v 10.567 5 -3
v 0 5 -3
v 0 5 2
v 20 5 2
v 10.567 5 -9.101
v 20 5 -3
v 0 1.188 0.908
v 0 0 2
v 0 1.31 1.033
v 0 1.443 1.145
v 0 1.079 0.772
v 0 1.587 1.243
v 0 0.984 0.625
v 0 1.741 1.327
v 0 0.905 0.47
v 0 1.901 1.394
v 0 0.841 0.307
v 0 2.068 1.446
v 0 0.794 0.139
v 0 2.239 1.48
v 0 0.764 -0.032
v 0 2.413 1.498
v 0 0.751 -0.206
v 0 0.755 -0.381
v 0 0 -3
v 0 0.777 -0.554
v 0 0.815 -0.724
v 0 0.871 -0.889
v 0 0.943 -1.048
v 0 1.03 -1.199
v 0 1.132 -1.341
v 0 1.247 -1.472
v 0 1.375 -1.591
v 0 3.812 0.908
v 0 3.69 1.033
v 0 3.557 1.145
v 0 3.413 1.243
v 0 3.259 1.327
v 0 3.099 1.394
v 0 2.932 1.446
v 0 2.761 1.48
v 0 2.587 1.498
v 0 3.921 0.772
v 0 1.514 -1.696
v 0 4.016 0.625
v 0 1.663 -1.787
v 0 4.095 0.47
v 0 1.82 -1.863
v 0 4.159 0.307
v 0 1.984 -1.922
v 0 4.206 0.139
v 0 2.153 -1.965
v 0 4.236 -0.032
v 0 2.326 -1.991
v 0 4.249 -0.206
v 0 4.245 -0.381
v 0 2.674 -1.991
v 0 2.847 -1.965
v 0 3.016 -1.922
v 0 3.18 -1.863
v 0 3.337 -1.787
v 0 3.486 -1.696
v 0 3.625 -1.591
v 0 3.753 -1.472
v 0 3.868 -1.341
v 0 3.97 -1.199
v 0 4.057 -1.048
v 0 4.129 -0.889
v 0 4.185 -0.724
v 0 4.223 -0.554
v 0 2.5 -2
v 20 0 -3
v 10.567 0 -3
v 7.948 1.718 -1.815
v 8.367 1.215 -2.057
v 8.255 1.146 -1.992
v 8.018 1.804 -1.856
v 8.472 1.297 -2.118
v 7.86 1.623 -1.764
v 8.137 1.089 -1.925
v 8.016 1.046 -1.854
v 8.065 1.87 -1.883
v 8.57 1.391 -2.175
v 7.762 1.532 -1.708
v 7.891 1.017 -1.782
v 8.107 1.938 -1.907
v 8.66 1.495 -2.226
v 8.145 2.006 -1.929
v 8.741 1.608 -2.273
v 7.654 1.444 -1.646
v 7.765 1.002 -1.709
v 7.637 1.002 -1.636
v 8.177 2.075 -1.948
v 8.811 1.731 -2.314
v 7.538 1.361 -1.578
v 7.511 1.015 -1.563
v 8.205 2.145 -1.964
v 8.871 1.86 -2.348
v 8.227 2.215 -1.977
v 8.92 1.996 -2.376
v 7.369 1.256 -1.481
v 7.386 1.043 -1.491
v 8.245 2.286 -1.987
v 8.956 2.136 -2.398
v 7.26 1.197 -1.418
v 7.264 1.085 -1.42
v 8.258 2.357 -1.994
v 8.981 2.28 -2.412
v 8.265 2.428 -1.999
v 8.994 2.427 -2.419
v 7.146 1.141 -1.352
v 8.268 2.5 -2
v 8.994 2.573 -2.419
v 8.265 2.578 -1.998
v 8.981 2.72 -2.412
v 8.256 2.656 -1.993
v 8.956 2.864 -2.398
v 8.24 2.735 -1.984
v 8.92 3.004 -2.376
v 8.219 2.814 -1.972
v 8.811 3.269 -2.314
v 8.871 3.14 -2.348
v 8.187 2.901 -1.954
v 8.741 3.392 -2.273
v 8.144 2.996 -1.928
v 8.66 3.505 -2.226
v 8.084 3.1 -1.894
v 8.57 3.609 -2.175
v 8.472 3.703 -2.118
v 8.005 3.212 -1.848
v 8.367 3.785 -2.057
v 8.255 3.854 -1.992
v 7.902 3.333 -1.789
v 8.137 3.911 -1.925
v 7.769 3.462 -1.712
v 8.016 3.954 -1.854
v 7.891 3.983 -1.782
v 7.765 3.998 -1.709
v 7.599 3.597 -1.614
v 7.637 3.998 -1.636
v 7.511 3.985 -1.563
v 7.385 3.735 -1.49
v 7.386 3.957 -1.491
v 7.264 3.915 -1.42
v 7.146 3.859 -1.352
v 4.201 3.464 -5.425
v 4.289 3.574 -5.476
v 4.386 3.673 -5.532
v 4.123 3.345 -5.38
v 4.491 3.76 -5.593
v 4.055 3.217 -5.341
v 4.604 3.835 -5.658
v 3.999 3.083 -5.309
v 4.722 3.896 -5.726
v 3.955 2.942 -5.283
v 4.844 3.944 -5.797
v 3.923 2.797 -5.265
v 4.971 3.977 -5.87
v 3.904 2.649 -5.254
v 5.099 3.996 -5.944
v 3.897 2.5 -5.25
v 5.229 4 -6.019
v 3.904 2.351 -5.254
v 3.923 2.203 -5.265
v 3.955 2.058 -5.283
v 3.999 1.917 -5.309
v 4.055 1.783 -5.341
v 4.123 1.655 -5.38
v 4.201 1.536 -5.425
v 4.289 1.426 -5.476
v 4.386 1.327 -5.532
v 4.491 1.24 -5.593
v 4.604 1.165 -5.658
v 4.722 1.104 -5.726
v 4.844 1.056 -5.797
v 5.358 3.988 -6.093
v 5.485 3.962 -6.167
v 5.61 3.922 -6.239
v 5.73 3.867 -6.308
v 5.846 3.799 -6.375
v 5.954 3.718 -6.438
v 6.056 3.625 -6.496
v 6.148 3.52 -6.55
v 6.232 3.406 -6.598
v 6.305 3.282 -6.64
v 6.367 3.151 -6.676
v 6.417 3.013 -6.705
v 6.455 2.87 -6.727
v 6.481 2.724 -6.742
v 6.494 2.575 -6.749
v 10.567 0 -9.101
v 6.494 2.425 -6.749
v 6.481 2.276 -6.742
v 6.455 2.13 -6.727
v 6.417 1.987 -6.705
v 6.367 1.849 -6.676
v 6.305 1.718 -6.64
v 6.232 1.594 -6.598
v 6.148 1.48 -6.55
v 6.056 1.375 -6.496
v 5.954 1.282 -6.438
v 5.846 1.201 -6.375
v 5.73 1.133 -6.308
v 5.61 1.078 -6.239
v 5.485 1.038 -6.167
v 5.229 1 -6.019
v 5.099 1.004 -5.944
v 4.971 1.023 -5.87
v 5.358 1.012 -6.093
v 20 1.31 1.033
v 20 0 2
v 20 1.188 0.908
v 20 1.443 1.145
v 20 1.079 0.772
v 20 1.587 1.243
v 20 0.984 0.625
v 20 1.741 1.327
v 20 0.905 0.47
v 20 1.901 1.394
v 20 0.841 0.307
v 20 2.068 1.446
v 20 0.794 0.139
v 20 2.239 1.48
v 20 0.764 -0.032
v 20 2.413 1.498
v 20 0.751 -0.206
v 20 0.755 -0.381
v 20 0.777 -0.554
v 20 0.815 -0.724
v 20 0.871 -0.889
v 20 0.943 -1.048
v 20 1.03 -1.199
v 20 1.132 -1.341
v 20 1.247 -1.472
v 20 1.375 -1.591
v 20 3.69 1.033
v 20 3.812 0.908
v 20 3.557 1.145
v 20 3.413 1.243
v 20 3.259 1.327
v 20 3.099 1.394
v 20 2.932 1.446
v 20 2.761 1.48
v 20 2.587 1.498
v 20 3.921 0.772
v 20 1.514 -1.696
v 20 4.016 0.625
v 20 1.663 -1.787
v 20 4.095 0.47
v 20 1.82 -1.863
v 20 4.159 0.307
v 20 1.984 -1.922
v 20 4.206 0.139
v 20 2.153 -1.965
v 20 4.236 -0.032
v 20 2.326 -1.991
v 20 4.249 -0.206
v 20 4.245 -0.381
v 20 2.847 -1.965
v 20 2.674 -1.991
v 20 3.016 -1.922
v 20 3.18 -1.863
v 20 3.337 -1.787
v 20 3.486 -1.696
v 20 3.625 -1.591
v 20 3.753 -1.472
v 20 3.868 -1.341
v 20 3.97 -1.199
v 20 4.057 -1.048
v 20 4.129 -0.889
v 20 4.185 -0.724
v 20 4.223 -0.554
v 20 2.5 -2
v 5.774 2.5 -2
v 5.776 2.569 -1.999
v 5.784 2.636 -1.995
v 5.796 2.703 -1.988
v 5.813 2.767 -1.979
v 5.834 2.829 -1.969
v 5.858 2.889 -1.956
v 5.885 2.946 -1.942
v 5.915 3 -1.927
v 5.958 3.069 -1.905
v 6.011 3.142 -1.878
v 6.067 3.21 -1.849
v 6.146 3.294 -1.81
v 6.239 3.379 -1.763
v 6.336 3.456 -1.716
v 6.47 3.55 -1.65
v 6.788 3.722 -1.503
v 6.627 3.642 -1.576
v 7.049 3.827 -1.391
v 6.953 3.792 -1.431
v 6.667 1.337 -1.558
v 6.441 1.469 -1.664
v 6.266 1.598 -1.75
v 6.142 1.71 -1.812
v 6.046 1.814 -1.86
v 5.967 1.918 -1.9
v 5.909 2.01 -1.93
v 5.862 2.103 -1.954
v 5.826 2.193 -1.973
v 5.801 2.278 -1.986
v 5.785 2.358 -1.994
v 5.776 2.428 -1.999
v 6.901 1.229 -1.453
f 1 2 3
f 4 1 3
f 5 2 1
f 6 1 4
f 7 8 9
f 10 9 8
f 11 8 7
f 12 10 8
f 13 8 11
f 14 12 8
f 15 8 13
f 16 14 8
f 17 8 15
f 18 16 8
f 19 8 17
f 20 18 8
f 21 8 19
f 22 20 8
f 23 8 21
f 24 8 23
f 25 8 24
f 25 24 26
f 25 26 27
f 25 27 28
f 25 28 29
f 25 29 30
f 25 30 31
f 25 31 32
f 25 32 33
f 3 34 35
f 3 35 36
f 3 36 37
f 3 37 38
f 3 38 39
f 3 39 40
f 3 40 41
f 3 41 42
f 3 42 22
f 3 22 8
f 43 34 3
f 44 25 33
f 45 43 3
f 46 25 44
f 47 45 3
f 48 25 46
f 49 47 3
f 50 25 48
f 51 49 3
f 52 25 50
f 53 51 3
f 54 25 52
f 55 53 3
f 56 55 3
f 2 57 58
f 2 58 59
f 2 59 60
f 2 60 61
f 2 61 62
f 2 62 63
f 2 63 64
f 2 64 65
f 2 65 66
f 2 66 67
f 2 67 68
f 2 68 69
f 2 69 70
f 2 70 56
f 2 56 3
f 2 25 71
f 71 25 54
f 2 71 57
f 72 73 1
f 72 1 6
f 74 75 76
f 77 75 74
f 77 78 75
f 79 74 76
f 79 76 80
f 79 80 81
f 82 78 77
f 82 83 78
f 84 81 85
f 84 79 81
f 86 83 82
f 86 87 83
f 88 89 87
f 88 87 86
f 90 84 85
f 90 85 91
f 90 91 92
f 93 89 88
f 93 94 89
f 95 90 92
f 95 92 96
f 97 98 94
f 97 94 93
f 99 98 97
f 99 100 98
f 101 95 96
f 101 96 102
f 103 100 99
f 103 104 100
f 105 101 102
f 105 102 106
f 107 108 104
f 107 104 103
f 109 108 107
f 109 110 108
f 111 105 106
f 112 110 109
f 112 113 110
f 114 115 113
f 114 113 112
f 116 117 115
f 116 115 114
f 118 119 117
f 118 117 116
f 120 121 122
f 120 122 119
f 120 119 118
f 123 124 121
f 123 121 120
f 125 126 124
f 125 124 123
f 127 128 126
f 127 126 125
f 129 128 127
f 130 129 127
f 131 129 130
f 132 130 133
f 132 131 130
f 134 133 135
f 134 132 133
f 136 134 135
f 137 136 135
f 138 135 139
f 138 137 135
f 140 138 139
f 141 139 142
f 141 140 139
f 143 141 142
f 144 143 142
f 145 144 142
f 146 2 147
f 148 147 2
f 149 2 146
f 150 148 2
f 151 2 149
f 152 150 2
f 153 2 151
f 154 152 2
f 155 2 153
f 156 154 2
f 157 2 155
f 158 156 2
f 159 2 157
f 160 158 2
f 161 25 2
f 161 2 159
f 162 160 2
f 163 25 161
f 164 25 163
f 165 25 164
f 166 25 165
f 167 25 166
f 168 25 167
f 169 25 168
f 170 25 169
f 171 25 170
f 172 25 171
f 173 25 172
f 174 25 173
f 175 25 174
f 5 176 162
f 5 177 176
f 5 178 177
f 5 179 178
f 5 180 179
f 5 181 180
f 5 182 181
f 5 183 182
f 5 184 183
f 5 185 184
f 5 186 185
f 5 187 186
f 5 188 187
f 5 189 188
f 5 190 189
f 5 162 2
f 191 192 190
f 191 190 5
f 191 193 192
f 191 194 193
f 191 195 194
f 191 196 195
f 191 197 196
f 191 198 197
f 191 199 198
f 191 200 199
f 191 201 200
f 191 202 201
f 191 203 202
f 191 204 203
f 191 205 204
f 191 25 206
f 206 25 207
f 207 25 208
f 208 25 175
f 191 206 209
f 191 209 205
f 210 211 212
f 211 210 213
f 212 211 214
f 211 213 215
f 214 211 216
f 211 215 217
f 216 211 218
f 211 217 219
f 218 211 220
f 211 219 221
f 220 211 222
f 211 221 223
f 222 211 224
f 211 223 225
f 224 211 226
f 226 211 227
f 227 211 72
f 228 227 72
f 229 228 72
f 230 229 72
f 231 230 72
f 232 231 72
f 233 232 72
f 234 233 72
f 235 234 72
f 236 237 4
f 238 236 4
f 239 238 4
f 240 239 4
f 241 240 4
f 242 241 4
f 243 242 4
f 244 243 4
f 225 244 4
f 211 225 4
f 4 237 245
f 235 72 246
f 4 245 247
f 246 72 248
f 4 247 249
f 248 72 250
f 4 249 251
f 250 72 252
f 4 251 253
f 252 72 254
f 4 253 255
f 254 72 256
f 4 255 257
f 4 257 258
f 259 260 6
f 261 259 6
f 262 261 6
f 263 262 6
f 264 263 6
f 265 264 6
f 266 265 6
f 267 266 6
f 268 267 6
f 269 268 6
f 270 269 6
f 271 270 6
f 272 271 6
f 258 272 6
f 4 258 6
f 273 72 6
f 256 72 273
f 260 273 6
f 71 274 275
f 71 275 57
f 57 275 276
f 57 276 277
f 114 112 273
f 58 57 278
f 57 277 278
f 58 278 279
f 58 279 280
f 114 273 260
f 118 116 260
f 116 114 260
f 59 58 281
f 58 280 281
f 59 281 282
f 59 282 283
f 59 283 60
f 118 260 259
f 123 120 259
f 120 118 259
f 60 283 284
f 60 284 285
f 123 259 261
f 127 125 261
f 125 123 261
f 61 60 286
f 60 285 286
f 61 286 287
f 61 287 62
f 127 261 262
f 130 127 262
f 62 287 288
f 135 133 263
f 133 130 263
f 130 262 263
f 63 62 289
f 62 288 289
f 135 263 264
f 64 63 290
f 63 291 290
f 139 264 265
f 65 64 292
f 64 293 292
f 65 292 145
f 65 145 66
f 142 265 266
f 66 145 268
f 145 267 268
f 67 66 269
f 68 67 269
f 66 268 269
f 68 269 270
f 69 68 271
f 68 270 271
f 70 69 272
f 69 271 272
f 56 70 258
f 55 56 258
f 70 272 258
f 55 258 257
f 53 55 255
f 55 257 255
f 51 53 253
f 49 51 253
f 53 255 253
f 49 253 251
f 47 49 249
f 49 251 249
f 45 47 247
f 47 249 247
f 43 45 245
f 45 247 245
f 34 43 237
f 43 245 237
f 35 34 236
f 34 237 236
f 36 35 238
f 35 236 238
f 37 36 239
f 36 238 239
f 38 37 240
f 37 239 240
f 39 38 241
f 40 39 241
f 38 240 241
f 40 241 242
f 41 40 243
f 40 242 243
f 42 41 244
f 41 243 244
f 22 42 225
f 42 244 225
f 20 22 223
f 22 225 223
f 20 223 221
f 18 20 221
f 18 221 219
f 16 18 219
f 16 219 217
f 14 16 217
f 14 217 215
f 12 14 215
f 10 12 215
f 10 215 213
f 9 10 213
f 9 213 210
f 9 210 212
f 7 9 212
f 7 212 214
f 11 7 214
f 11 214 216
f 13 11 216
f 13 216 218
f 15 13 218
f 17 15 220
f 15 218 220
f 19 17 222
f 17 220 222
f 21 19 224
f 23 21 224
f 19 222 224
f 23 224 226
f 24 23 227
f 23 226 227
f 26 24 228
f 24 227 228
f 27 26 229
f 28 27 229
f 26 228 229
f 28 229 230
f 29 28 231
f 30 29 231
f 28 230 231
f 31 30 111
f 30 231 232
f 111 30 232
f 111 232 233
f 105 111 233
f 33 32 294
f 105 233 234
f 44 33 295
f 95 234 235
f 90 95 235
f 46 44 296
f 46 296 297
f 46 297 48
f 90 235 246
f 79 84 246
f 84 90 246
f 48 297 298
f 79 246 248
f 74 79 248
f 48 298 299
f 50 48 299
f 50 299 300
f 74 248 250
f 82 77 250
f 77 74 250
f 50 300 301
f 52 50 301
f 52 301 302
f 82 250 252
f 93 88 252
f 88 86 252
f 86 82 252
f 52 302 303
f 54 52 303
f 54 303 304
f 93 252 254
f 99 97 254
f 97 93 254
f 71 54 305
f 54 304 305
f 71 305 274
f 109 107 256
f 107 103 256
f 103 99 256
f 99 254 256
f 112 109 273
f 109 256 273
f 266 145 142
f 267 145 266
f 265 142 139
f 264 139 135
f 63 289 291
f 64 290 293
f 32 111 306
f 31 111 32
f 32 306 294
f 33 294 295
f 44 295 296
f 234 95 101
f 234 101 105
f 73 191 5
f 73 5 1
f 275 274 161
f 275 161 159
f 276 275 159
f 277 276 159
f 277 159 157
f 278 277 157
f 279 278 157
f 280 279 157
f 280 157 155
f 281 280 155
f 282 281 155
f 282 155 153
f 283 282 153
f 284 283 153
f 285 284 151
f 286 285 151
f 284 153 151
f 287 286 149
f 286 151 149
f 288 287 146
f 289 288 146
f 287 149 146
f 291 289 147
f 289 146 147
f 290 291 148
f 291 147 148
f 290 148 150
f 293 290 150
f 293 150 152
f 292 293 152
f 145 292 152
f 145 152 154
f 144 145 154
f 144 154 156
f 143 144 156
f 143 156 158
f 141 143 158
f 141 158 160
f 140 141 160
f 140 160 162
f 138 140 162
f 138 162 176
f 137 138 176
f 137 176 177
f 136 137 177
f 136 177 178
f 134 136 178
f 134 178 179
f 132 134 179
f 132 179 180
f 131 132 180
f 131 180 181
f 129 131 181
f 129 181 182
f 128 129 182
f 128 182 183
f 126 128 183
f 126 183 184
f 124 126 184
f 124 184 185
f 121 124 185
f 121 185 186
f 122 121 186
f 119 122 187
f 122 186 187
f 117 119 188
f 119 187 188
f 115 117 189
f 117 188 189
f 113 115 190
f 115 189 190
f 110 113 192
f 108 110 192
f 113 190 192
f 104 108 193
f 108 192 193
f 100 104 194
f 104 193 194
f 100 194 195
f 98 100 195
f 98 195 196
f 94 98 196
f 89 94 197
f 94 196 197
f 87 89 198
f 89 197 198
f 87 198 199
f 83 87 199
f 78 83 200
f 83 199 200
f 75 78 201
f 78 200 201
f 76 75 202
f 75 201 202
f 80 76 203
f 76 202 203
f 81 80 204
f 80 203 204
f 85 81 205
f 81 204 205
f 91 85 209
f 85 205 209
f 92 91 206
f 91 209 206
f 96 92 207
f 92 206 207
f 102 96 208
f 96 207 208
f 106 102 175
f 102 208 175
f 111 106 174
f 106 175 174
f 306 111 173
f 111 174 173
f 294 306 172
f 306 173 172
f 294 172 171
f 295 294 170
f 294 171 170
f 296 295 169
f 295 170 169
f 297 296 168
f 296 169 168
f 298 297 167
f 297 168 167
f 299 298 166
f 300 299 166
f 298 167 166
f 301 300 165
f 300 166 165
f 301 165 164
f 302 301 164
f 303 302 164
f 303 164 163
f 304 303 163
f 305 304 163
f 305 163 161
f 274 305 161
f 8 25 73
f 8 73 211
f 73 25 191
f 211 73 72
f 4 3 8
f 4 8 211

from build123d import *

# Parameters (mm, degrees)
BOSS_EXTRUDE1_DEPTH = 5
SKETCH2_R           = 1.5
CUT_EXTRUDE1_DEPTH  = 5
SKETCH5_W           = 20
SKETCH5_H           = 5
BOSS_EXTRUDE3_DEPTH = 2
CUT_EXTRUDE2_REACH  = 24.535
SKETCH6_R           = 1.75


with BuildPart() as part:
    # Sketch1 → Boss-Extrude1 (new body)
    with BuildSketch(Plane(origin=(0, 0, 0), x_dir=(1, 0, 0), z_dir=(0, 1, 0))):
        Polygon((0, 0), (0, 3), (10.567063084, 9.100896716), (10.567063084, 3), (20, 3), (20, 0), align=None)
    extrude(amount=BOSS_EXTRUDE1_DEPTH)

    # Sketch2 → Cut-Extrude1 (cut)
    with BuildSketch(Plane(origin=(-1.299038106, 0, -2.25), x_dir=(-0.8660254037844397, 0, 0.49999999999999806), z_dir=(-0.49999999999999806, 0, -0.8660254037844397))):
        with Locations((-7.5, 2.5)):
            Circle(SKETCH2_R)
    extrude(amount=-CUT_EXTRUDE1_DEPTH, mode=Mode.SUBTRACT)

    # Sketch5 → Boss-Extrude3 (add)
    with BuildSketch(Plane.XY):
        with Locations((10, 2.5)):
            Rectangle(SKETCH5_W, SKETCH5_H)
    extrude(amount=BOSS_EXTRUDE3_DEPTH)

    # Cut-Extrude2: up to this face of the body (flat: up to its plane)
    cut_extrude2_end = Plane(part.part.faces().sort_by_distance((0, 2.5, -0.5))[0])
    # Sketch6 → Cut-Extrude2 (cut, up to the picked face)
    with BuildSketch(Plane(origin=(20, 0, 0), x_dir=(0, 0, -1), z_dir=(1, 0, 0)), mode=Mode.PRIVATE) as cut_extrude2_sk1:
        with Locations((0.25, 2.5)):
            Circle(SKETCH6_R)
    cut_extrude2_tool1 = split(extrude(cut_extrude2_sk1.sketch, amount=-CUT_EXTRUDE2_REACH, mode=Mode.PRIVATE), bisect_by=cut_extrude2_end, keep=Keep.BOTH, mode=Mode.PRIVATE)
    add(cut_extrude2_tool1.solids().sort_by(Axis((20, 2.5, -0.25), (-1, 0, 0)))[0], mode=Mode.SUBTRACT)


solid = part.part
